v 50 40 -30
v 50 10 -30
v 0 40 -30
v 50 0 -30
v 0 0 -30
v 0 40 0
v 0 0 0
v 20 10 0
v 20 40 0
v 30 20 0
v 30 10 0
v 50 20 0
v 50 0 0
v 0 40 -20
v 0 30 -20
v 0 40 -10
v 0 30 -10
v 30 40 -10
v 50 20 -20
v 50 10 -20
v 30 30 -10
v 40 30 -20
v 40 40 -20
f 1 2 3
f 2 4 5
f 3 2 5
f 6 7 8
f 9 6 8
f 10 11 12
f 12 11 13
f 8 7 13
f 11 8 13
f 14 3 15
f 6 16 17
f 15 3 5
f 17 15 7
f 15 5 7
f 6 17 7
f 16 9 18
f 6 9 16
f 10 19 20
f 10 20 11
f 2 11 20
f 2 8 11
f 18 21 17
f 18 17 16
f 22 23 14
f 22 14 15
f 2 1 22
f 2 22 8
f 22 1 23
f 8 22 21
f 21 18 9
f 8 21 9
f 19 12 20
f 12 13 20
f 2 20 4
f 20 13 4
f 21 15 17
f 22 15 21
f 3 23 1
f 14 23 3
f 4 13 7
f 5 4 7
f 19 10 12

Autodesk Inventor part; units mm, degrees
ref_plane "YZ Plane" through (0, 0, 0) normal (1, 0, 0) x (0, 1, 0)
ref_plane "XZ Plane" through (0, 0, 0) normal (0, 1, 0) x (-1, 0, 0)
ref_plane "XY Plane" through (0, 0, 0) normal (0, 0, 1) x (1, 0, 0)
sketch "草圖1" plane through (0, 0, 0) normal (0, 1, 0) x (-1, 0, 0)
  line L0 (0, 0) -> (-50, 0)
  line L1 (-50, 0) -> (-50, -30)
  line L2 (-50, -30) -> (0, -30)
  line L3 (0, -30) -> (0, 0)
  dimension "d0" = 30
  dimension "d1" = 50
extrude "擠出1" add sketch "草圖1" along normal blind 40
sketch "草圖2" plane through (50, 0, 0) normal (1, 0, 0) x (0, 0, -1)
  line L0 (0, 40) -> (30, 40) projected
  line L1 (10, 40) -> (20, 40)
  line L2 (20, 40) -> (20, 30)
  line L3 (20, 30) -> (10, 30)
  line L4 (10, 30) -> (10, 40)
  point P0 (0, 0)
  dimension "d4" = 10
  dimension "d5" = 10
  dimension "d6" = 10
extrude "擠出2" cut sketch "草圖2" against normal through all
sketch "草圖3" plane through (0, 40, 0) normal (0, 1, 0) x (1, 0, 0)
  line L0 (50, 0) -> (50, 30) projected
  line L1 (50, 30) -> (20, 0)
  line L2 (0, 0) -> (50, 0) projected
  line L3 (50, 20) -> (30, 0)
  line L4 (20, 0) -> (30, 0)
  line L5 (50, 30) -> (50, 20)
  dimension "d9" = 10
  dimension "d10" = 135
extrude "擠出3" cut sketch "草圖3" against normal blind 30 contours L3 L2 L1 L0
sketch "草圖4" plane through (0, 40, 0) normal (0, 1, 0) x (1, 0, 0)
  line L0 (40, 10) -> (30, 0) projected
  line L1 (30, 0) -> (50, 0) projected
  line L2 (50, 0) -> (50, 10) projected
  line L3 (50, 10) -> (40, 10) projected
  line L4 (50, 20) -> (40, 10) projected
  line L5 (50, 10) -> (40, 10) projected
  line L6 (50, 20) -> (50, 10) projected
  point P0 (0, 0)
extrude "擠出4" cut sketch "草圖4" against normal blind 20
properties part number "17"
